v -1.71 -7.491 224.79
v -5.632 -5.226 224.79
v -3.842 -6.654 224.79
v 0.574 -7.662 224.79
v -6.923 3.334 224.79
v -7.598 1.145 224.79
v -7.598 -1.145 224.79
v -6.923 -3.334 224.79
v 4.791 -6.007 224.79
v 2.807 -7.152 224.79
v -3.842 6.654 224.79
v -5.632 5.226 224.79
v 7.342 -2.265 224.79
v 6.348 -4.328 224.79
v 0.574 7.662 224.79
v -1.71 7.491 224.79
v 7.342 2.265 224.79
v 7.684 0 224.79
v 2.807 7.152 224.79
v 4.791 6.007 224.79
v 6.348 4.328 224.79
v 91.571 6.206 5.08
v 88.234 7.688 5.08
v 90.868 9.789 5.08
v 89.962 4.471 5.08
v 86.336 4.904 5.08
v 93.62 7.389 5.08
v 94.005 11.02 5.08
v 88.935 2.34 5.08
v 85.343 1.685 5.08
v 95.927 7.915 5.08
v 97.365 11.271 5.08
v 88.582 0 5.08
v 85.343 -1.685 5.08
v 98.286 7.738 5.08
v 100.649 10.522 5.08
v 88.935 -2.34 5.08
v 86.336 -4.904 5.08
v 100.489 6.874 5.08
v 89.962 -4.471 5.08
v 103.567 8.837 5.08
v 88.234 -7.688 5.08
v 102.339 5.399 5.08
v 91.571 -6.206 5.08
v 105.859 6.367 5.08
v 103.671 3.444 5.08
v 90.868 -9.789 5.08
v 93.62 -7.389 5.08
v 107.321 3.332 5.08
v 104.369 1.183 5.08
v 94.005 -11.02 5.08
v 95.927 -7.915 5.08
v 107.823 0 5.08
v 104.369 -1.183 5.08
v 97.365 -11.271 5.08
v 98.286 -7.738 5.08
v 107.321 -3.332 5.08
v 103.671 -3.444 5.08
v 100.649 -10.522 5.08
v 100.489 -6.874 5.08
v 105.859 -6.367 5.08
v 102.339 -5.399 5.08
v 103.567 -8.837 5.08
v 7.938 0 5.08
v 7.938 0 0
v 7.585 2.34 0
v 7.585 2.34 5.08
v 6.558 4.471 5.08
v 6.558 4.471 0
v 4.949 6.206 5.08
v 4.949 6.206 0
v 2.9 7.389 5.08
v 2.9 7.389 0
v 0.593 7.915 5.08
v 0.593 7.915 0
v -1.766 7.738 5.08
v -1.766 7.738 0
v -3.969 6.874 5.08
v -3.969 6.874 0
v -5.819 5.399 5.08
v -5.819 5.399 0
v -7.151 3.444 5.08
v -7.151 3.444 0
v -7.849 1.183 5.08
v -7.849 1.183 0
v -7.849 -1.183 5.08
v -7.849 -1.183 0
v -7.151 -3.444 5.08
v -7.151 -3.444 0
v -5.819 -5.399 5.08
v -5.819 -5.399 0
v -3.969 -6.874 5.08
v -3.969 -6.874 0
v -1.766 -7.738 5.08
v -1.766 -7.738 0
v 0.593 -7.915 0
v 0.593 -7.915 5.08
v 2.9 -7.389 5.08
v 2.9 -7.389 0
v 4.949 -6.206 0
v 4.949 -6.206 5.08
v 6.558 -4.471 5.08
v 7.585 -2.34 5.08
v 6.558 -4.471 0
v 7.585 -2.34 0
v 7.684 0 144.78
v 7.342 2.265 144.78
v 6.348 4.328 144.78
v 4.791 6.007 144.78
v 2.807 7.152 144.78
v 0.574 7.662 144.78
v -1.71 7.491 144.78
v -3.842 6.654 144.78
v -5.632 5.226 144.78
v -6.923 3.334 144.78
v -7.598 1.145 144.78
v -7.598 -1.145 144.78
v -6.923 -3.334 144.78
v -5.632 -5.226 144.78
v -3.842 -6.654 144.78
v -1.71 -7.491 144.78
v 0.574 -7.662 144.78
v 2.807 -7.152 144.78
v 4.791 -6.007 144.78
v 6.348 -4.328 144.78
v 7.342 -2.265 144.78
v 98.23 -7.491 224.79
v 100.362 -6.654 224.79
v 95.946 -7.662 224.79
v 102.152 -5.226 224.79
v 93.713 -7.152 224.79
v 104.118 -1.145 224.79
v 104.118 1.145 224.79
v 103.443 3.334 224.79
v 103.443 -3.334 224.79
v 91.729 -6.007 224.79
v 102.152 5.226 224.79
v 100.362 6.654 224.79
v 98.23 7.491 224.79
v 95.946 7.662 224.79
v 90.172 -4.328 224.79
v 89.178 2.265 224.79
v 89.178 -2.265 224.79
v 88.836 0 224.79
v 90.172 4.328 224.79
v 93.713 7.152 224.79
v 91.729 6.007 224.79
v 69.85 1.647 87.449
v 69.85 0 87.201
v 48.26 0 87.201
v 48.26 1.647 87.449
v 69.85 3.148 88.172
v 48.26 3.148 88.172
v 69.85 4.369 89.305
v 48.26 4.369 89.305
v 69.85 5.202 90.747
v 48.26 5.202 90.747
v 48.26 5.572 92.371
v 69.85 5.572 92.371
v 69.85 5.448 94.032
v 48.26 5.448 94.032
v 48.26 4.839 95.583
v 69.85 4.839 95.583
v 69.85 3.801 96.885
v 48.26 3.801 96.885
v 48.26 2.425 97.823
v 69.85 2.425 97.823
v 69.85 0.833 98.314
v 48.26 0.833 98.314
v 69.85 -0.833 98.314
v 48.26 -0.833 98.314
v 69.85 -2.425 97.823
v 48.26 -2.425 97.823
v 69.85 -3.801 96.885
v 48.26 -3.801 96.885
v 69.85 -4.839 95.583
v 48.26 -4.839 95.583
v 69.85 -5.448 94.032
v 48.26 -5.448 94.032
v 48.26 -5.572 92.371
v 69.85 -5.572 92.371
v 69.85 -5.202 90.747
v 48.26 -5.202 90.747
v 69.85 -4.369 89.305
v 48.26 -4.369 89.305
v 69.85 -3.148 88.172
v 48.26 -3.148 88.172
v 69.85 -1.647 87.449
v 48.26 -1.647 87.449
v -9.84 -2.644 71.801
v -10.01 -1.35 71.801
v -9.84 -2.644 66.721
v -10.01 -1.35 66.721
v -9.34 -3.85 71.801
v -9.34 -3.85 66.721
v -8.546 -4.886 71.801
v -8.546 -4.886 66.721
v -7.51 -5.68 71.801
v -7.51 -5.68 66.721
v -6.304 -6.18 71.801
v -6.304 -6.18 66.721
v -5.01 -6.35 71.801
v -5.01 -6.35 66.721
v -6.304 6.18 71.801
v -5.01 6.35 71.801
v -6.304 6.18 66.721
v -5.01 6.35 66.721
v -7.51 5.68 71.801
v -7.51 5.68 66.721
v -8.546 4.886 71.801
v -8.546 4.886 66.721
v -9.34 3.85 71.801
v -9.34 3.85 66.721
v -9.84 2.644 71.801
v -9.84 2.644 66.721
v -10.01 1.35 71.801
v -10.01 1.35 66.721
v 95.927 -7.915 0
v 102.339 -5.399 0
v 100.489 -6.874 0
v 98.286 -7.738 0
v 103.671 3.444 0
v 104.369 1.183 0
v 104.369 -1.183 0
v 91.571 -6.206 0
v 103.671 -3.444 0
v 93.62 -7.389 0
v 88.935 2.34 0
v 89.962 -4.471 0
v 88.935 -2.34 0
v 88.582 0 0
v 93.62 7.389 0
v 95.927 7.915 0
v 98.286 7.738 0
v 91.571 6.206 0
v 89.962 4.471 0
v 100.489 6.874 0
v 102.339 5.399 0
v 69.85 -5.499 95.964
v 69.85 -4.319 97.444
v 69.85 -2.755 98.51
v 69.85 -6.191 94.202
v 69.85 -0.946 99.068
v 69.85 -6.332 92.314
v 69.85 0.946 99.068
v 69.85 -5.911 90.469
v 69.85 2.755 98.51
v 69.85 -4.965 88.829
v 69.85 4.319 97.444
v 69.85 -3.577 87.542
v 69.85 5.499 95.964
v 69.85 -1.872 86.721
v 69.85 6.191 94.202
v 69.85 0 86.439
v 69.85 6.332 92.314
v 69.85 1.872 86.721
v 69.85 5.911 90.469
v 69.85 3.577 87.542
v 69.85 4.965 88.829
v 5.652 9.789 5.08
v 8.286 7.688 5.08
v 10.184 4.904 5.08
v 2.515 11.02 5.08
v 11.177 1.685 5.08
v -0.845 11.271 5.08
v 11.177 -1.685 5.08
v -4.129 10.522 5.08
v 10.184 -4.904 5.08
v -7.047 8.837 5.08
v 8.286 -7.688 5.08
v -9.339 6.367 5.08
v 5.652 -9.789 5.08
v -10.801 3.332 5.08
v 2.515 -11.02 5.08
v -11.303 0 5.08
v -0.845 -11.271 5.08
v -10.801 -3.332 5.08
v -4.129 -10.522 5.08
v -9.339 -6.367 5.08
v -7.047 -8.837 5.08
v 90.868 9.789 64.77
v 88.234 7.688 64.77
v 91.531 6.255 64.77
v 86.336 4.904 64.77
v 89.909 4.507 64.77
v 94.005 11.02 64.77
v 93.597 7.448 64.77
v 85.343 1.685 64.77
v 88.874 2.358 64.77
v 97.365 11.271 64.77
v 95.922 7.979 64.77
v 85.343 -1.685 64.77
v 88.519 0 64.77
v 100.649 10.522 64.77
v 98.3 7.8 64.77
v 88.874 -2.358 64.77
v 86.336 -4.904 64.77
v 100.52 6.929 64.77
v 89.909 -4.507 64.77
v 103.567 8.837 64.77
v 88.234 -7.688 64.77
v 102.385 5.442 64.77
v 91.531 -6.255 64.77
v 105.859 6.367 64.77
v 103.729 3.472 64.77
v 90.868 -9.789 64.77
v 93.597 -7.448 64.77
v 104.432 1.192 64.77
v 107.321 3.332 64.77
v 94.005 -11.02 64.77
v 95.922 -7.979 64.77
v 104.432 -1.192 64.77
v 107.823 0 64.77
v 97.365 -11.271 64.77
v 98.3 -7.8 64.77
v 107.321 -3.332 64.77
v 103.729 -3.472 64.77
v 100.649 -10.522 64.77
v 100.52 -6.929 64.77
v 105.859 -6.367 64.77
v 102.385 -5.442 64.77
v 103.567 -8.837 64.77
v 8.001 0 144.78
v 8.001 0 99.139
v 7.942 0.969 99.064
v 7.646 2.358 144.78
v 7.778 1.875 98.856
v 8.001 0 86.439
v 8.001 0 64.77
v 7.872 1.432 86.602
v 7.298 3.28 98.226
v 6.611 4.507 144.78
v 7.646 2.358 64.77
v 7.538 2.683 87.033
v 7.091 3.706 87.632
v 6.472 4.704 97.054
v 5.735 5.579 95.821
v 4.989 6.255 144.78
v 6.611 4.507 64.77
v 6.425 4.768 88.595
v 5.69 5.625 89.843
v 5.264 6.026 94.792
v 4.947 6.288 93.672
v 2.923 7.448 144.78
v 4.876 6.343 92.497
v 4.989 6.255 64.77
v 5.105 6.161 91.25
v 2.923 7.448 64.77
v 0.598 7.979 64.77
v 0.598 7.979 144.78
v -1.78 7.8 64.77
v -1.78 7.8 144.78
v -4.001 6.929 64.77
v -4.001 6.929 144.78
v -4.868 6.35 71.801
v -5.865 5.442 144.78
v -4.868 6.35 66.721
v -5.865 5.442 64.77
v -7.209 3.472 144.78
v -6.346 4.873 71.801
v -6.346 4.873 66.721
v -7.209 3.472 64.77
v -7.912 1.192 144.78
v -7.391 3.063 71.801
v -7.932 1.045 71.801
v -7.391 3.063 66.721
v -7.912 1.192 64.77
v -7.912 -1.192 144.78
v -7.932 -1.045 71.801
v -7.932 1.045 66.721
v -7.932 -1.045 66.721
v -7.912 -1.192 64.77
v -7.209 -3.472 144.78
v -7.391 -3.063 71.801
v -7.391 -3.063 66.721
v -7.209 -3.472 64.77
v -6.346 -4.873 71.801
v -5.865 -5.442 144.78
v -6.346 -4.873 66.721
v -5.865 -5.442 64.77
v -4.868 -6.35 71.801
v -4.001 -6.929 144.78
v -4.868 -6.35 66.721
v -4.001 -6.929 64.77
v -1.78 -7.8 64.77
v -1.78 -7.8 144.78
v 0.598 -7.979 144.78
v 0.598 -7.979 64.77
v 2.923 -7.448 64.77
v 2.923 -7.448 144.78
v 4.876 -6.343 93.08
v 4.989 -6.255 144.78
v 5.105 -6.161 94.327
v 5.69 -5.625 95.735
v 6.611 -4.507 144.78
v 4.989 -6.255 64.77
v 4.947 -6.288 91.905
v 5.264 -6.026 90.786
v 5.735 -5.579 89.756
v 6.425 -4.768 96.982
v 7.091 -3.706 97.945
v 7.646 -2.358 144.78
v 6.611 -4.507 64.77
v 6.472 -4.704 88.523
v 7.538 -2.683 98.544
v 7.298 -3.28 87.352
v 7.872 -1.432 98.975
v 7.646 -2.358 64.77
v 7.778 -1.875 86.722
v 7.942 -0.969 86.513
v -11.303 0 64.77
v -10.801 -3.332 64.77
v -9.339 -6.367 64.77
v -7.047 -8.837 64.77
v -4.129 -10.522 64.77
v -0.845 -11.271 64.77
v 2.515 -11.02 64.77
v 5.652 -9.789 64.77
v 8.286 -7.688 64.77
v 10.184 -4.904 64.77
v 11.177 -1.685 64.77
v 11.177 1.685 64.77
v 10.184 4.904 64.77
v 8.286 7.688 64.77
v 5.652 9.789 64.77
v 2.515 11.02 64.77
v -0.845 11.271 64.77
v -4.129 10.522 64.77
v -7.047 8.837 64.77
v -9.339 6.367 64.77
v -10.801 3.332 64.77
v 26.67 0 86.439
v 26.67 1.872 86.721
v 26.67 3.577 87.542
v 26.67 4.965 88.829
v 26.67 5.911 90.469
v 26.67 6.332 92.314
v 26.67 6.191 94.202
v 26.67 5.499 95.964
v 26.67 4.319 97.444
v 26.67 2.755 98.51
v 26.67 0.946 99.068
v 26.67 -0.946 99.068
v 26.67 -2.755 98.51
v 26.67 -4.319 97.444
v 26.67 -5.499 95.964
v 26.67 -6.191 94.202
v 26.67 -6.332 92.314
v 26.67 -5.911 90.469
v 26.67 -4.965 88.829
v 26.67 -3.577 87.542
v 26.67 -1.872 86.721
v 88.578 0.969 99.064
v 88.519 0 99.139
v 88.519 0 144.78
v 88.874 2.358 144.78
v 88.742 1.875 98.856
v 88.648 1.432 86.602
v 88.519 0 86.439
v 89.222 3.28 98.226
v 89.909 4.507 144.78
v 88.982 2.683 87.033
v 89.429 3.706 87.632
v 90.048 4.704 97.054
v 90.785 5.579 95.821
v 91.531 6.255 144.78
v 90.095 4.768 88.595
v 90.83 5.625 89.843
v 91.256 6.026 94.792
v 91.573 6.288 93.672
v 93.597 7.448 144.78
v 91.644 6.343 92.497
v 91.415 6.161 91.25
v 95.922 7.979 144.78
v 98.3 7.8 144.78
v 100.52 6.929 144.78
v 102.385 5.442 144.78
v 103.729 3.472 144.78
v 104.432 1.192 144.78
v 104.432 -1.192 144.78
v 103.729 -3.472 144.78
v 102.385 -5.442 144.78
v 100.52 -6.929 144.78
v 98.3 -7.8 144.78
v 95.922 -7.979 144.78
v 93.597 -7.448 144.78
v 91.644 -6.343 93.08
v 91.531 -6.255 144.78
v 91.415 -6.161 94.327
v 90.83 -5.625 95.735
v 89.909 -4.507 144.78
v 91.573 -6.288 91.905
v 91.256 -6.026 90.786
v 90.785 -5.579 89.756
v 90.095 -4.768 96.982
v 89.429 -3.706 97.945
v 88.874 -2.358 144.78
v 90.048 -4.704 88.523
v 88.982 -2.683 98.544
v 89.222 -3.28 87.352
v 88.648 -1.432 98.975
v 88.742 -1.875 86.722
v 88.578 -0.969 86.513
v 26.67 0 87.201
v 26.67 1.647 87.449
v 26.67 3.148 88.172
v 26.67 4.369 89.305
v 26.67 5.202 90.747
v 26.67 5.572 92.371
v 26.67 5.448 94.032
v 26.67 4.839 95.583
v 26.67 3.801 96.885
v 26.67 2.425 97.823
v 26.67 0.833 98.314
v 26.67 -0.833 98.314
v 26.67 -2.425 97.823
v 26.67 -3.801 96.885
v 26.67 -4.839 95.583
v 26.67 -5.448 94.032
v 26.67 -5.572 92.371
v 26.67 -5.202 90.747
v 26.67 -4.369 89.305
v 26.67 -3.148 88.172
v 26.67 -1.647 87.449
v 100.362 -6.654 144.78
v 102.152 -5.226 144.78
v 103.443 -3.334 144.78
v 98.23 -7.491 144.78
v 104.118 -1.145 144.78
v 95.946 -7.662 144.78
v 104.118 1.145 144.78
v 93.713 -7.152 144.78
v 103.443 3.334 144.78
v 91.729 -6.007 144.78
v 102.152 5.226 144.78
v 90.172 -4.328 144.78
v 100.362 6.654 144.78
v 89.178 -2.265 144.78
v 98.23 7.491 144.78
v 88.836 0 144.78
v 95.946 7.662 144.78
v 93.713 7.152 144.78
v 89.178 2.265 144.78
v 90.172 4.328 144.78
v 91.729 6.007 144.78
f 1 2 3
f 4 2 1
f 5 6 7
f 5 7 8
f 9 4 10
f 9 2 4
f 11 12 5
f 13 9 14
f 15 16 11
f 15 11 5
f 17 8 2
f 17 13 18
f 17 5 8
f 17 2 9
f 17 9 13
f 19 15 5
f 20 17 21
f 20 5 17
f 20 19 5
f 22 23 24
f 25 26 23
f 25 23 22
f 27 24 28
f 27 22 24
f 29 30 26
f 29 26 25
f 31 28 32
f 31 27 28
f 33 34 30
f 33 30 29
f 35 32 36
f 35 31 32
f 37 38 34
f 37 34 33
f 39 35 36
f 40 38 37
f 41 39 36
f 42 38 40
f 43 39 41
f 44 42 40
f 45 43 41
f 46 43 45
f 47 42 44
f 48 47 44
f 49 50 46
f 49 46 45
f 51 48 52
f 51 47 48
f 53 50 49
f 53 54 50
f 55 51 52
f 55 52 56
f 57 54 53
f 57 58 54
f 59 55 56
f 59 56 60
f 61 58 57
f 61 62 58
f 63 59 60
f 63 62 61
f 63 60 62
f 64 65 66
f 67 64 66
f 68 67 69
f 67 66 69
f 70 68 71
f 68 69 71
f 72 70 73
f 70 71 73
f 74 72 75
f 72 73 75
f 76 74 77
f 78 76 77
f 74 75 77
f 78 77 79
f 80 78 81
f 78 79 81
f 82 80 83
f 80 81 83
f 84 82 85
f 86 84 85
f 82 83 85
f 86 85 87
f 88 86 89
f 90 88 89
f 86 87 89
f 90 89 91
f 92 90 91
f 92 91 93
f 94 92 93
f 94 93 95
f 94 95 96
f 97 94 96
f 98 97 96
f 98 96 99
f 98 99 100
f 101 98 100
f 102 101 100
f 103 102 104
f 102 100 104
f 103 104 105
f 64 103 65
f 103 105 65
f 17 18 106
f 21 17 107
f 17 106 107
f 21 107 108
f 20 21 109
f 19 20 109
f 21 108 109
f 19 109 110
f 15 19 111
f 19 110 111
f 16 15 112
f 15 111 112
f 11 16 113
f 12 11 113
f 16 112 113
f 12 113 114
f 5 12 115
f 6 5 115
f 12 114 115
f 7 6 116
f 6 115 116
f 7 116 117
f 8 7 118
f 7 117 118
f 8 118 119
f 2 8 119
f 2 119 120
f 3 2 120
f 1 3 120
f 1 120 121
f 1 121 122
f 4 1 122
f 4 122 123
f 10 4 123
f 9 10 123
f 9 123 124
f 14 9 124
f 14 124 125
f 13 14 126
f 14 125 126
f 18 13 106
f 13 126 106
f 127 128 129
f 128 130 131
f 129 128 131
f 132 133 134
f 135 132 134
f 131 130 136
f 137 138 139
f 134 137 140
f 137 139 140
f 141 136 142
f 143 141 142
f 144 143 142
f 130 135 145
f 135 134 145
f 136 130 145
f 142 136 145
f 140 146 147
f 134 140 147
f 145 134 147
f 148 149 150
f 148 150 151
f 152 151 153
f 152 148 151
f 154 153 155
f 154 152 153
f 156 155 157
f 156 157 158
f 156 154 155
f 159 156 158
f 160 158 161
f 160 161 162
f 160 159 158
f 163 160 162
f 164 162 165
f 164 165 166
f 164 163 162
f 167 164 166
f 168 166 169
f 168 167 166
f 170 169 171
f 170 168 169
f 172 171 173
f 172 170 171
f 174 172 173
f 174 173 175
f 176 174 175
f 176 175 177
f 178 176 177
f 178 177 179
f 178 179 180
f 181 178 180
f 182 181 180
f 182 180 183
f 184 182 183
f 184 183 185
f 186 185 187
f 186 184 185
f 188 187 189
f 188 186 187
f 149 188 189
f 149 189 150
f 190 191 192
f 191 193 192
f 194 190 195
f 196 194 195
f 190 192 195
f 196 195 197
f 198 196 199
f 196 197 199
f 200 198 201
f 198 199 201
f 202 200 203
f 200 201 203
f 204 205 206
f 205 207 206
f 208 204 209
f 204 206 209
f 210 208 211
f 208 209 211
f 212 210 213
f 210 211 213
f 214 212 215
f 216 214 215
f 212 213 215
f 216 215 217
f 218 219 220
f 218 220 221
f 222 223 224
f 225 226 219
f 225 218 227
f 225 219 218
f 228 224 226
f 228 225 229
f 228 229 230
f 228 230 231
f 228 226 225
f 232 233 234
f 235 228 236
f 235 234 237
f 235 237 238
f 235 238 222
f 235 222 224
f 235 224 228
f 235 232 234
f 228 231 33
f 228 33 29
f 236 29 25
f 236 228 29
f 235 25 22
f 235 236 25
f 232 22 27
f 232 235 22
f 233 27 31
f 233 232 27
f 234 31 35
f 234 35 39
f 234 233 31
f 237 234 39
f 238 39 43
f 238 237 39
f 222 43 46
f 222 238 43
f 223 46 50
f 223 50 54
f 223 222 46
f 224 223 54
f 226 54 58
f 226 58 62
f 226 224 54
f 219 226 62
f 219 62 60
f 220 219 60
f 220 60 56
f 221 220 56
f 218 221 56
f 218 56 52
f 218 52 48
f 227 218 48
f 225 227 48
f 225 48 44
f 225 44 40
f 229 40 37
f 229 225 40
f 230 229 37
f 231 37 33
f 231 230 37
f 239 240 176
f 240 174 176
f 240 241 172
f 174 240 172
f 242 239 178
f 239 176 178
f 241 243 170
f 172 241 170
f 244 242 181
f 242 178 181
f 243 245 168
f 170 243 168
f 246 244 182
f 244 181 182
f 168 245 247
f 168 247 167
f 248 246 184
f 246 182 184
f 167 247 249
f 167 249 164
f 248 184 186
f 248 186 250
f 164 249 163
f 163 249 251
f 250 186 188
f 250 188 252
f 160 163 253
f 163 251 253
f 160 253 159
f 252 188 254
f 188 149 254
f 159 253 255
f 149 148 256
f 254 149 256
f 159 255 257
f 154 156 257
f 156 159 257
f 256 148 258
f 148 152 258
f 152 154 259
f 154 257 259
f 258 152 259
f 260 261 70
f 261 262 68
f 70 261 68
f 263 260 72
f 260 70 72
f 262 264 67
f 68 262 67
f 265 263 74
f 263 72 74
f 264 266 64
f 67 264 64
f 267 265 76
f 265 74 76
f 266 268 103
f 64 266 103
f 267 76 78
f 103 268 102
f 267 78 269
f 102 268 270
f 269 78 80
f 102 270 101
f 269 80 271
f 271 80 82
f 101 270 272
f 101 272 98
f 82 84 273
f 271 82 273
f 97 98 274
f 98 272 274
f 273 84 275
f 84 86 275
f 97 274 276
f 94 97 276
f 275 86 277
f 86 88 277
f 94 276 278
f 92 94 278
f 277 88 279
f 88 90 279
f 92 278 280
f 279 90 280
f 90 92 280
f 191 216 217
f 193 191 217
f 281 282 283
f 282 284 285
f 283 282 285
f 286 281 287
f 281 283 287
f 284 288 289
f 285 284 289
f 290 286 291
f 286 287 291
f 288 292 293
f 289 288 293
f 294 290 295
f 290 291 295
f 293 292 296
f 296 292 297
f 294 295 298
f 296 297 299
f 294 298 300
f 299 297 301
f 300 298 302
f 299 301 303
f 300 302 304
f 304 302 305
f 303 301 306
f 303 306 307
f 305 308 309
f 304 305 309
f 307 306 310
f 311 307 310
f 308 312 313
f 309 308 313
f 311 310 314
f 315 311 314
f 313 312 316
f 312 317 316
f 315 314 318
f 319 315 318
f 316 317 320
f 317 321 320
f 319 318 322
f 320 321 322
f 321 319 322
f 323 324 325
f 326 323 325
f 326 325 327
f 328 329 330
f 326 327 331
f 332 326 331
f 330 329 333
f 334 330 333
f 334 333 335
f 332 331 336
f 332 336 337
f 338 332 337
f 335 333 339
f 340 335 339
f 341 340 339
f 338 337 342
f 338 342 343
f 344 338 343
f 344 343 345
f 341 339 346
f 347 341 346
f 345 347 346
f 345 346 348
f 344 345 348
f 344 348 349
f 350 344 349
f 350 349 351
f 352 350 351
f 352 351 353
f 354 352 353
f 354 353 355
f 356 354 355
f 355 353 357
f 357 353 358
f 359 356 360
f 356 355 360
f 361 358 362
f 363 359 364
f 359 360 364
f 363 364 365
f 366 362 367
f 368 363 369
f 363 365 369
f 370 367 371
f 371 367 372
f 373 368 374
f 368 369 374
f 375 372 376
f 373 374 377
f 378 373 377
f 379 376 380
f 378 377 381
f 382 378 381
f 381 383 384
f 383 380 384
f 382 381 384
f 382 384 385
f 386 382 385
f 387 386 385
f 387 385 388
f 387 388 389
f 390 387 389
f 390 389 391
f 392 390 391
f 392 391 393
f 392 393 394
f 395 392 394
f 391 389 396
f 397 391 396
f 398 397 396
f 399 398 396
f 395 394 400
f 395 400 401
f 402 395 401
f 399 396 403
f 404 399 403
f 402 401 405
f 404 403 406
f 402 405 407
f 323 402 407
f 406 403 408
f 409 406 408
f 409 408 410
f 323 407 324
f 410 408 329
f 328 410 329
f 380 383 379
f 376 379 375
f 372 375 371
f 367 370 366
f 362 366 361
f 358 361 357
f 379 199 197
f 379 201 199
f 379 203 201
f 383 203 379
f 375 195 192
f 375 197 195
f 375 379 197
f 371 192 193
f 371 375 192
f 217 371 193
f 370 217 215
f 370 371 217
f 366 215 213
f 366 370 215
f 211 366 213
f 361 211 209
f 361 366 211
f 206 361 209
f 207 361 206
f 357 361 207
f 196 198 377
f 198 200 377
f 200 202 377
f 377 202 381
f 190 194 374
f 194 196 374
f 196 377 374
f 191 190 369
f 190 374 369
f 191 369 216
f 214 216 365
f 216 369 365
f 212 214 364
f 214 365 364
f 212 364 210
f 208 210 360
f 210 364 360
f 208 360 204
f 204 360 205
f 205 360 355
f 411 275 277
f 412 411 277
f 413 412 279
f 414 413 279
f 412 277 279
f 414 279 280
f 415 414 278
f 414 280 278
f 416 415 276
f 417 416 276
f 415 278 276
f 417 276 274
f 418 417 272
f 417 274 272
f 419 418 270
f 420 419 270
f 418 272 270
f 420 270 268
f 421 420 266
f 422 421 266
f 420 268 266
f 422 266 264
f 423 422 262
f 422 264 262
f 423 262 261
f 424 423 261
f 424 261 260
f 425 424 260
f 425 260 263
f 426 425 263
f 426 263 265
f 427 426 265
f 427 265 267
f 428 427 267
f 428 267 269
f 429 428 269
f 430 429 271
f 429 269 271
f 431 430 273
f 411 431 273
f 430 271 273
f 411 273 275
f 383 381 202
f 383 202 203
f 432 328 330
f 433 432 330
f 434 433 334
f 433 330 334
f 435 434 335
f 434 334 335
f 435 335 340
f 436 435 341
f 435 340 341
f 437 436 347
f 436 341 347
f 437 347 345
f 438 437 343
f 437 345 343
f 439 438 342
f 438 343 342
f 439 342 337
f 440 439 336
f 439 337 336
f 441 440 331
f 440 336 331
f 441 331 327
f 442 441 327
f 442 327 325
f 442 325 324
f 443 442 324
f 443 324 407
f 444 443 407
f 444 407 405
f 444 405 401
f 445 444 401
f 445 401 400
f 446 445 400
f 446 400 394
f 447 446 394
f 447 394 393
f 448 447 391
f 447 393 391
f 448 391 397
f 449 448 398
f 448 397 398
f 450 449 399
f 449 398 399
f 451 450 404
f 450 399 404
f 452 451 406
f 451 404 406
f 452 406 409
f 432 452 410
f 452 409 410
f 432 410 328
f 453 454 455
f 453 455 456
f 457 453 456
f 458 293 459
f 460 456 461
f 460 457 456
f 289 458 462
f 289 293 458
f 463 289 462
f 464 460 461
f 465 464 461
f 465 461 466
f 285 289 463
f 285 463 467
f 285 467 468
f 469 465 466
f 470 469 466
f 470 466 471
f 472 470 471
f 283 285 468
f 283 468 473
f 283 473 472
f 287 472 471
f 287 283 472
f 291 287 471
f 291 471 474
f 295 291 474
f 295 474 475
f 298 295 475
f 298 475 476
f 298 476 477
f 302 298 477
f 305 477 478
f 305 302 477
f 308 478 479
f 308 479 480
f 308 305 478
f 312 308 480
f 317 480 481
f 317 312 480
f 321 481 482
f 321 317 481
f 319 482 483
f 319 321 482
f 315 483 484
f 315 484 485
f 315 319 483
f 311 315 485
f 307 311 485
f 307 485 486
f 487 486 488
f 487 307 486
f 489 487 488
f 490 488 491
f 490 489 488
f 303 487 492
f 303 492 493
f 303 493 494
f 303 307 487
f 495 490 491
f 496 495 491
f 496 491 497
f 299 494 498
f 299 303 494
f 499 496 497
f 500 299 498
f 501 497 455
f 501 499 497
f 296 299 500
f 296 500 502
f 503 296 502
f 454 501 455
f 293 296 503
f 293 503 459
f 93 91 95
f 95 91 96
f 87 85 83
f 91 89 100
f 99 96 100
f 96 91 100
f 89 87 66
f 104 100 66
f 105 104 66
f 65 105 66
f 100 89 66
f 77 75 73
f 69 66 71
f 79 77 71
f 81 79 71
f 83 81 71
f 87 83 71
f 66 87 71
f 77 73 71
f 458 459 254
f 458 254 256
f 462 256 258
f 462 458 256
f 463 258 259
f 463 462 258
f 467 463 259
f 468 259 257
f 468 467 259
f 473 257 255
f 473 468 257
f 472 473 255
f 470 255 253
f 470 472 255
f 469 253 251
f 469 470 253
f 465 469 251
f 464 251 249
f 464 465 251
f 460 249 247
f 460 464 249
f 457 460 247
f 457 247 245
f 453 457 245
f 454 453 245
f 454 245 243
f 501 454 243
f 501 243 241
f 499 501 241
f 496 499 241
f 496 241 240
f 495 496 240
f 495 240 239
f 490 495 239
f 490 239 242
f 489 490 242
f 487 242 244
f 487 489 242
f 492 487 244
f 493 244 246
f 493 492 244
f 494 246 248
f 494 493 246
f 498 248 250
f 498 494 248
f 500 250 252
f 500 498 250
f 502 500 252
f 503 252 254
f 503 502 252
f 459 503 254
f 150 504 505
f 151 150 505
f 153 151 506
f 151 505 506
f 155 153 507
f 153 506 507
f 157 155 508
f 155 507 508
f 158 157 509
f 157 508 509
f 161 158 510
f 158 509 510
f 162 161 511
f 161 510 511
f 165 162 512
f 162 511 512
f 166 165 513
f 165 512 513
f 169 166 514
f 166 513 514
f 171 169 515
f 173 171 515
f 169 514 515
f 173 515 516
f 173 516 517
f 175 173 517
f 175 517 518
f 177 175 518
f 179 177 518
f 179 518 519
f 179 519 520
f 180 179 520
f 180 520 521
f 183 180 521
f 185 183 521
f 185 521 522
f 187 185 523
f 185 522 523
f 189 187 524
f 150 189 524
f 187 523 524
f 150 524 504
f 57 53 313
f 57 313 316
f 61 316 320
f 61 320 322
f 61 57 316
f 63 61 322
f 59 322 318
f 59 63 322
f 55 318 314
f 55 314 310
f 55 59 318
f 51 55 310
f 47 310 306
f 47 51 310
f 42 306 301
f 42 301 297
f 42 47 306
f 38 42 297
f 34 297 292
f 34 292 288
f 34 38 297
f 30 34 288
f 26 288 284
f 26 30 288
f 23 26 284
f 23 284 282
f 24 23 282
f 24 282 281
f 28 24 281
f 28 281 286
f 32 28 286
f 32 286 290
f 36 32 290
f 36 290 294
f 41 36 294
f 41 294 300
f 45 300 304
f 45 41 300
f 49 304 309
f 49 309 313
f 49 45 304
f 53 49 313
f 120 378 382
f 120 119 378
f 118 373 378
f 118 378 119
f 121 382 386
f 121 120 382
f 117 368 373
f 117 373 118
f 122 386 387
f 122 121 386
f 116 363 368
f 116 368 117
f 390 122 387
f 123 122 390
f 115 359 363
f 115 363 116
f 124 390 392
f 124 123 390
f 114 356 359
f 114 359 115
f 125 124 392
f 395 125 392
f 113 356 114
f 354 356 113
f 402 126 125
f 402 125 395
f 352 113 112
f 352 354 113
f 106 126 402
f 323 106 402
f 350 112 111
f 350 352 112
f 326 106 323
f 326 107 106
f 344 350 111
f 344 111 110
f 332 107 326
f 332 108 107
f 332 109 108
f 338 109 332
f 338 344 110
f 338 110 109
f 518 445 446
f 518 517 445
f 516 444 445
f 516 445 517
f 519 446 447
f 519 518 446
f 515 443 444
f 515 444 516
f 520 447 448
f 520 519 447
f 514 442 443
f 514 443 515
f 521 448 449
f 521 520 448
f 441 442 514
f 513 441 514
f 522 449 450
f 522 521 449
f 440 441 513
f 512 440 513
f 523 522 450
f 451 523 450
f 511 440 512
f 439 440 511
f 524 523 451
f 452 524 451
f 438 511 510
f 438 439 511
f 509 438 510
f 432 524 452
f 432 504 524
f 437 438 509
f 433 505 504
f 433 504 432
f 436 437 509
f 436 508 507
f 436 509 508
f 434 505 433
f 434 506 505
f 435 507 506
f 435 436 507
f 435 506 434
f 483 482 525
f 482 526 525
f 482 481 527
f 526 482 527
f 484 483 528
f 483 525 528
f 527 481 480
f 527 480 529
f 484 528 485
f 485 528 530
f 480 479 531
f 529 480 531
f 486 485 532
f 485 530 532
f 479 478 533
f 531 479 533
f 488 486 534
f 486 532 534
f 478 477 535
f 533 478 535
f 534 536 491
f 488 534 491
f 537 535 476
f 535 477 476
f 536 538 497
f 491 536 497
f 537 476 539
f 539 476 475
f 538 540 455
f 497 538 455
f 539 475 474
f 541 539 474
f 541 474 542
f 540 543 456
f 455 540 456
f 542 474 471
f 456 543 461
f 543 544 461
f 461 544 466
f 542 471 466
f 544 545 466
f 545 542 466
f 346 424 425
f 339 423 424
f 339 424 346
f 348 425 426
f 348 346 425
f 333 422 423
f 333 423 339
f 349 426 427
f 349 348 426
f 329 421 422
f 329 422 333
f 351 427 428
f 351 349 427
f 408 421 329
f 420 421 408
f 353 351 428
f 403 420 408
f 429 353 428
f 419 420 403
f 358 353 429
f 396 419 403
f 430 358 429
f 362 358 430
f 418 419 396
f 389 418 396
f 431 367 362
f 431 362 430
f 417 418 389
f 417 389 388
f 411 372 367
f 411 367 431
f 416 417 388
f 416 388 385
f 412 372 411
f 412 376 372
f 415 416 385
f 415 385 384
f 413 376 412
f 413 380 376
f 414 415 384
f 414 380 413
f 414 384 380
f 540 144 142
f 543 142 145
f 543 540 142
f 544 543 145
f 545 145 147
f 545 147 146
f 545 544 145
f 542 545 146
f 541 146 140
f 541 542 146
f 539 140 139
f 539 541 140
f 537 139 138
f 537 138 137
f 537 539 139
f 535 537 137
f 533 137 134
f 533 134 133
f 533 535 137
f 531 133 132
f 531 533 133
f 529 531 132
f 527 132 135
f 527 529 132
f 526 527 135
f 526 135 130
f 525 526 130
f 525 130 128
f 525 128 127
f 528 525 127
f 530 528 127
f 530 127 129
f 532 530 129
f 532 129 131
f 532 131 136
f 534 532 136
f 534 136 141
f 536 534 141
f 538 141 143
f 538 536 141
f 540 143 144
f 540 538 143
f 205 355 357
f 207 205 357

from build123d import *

# Parameters (mm, degrees)
SKETCH1_R           = 7.9375
BOSS_EXTRUDE1_DEPTH = 5.08
SKETCH2_R           = 11.303
BOSS_EXTRUDE2_DEPTH = 59.69
SKETCH3_R           = 8.001
BOSS_EXTRUDE3_DEPTH = 80.01
SKETCH4_R           = 7.6835
BOSS_EXTRUDE4_DEPTH = 80.01
SKETCH6_W           = 5.08
SKETCH6_H           = 12.7
BOSS_EXTRUDE5_DEPTH = 10.01
FILLET1_R           = 5
SKETCH7_R           = 6.35
BOSS_EXTRUDE6_DEPTH = 26.67
SKETCH8_R           = 5.588
BOSS_EXTRUDE7_DEPTH = 21.59


with BuildPart() as part:
    # Sketch1 → Boss-Extrude1 (new body)
    with BuildSketch(Plane.XY):
        Circle(SKETCH1_R)
    boss_extrude1 = extrude(amount=BOSS_EXTRUDE1_DEPTH)

    # Sketch2 → Boss-Extrude2 (add)
    with BuildSketch(Plane.XY.offset(5.08)):
        with Locations(Location((0, 0, 0), (0, 0, 180))):
            Circle(SKETCH2_R)
    boss_extrude2 = extrude(amount=BOSS_EXTRUDE2_DEPTH)

    # Sketch3 → Boss-Extrude3 (add)
    with BuildSketch(Plane.XY.offset(64.77)):
        Circle(SKETCH3_R)
    boss_extrude3 = extrude(amount=BOSS_EXTRUDE3_DEPTH)

    # Sketch4 → Boss-Extrude4 (add)
    with BuildSketch(Plane.XY.offset(144.78)):
        Circle(SKETCH4_R)
    boss_extrude4 = extrude(amount=BOSS_EXTRUDE4_DEPTH)

    # Sketch6 → Boss-Extrude5 (add)
    with BuildSketch(Plane(origin=(0, 0, 0), x_dir=(0, 0, -1), z_dir=(1, 0, 0))):
        with Locations((-69.261191794, 0)):
            Rectangle(SKETCH6_W, SKETCH6_H)
    extrude(amount=-BOSS_EXTRUDE5_DEPTH)

    # Fillet1
    fillet1_edges = [part.edges().sort_by_distance(p)[0] for p in [
        (-10.01, -6.35, 69.261191794),
        (-10.01, 6.35, 69.261191794),
    ]]
    fillet(fillet1_edges, radius=FILLET1_R)

    # Sketch7 → Boss-Extrude6 (add)
    with BuildSketch(Plane(origin=(0, 0, 0), x_dir=(0, 0, -1), z_dir=(1, 0, 0))):
        with Locations((-92.78865741, 0)):
            Circle(SKETCH7_R)
    boss_extrude6 = extrude(amount=BOSS_EXTRUDE6_DEPTH)

    # Sketch8 → Boss-Extrude7 (add)
    with BuildSketch(Plane(origin=(26.67, 0, 0), x_dir=(0, 0, -1), z_dir=(1, 0, 0))):
        with Locations((-92.78865741, 0)):
            Circle(SKETCH8_R)
    boss_extrude7 = extrude(amount=BOSS_EXTRUDE7_DEPTH)

    # Mirror2: Boss-Extrude1, Boss-Extrude2, Boss-Extrude3, Boss-Extrude4, Boss-Extrude6, Boss-Extrude7 across plane
    add(boss_extrude1.mirror(Plane(origin=(48.26, 0, 92.78865741), x_dir=(0, 0, 1), z_dir=(1, 0, 0))))
    add(boss_extrude2.mirror(Plane(origin=(48.26, 0, 92.78865741), x_dir=(0, 0, 1), z_dir=(1, 0, 0))))
    add(boss_extrude3.mirror(Plane(origin=(48.26, 0, 92.78865741), x_dir=(0, 0, 1), z_dir=(1, 0, 0))))
    add(boss_extrude4.mirror(Plane(origin=(48.26, 0, 92.78865741), x_dir=(0, 0, 1), z_dir=(1, 0, 0))))
    add(boss_extrude6.mirror(Plane(origin=(48.26, 0, 92.78865741), x_dir=(0, 0, 1), z_dir=(1, 0, 0))))
    add(boss_extrude7.mirror(Plane(origin=(48.26, 0, 92.78865741), x_dir=(0, 0, 1), z_dir=(1, 0, 0))))


solid = part.part
